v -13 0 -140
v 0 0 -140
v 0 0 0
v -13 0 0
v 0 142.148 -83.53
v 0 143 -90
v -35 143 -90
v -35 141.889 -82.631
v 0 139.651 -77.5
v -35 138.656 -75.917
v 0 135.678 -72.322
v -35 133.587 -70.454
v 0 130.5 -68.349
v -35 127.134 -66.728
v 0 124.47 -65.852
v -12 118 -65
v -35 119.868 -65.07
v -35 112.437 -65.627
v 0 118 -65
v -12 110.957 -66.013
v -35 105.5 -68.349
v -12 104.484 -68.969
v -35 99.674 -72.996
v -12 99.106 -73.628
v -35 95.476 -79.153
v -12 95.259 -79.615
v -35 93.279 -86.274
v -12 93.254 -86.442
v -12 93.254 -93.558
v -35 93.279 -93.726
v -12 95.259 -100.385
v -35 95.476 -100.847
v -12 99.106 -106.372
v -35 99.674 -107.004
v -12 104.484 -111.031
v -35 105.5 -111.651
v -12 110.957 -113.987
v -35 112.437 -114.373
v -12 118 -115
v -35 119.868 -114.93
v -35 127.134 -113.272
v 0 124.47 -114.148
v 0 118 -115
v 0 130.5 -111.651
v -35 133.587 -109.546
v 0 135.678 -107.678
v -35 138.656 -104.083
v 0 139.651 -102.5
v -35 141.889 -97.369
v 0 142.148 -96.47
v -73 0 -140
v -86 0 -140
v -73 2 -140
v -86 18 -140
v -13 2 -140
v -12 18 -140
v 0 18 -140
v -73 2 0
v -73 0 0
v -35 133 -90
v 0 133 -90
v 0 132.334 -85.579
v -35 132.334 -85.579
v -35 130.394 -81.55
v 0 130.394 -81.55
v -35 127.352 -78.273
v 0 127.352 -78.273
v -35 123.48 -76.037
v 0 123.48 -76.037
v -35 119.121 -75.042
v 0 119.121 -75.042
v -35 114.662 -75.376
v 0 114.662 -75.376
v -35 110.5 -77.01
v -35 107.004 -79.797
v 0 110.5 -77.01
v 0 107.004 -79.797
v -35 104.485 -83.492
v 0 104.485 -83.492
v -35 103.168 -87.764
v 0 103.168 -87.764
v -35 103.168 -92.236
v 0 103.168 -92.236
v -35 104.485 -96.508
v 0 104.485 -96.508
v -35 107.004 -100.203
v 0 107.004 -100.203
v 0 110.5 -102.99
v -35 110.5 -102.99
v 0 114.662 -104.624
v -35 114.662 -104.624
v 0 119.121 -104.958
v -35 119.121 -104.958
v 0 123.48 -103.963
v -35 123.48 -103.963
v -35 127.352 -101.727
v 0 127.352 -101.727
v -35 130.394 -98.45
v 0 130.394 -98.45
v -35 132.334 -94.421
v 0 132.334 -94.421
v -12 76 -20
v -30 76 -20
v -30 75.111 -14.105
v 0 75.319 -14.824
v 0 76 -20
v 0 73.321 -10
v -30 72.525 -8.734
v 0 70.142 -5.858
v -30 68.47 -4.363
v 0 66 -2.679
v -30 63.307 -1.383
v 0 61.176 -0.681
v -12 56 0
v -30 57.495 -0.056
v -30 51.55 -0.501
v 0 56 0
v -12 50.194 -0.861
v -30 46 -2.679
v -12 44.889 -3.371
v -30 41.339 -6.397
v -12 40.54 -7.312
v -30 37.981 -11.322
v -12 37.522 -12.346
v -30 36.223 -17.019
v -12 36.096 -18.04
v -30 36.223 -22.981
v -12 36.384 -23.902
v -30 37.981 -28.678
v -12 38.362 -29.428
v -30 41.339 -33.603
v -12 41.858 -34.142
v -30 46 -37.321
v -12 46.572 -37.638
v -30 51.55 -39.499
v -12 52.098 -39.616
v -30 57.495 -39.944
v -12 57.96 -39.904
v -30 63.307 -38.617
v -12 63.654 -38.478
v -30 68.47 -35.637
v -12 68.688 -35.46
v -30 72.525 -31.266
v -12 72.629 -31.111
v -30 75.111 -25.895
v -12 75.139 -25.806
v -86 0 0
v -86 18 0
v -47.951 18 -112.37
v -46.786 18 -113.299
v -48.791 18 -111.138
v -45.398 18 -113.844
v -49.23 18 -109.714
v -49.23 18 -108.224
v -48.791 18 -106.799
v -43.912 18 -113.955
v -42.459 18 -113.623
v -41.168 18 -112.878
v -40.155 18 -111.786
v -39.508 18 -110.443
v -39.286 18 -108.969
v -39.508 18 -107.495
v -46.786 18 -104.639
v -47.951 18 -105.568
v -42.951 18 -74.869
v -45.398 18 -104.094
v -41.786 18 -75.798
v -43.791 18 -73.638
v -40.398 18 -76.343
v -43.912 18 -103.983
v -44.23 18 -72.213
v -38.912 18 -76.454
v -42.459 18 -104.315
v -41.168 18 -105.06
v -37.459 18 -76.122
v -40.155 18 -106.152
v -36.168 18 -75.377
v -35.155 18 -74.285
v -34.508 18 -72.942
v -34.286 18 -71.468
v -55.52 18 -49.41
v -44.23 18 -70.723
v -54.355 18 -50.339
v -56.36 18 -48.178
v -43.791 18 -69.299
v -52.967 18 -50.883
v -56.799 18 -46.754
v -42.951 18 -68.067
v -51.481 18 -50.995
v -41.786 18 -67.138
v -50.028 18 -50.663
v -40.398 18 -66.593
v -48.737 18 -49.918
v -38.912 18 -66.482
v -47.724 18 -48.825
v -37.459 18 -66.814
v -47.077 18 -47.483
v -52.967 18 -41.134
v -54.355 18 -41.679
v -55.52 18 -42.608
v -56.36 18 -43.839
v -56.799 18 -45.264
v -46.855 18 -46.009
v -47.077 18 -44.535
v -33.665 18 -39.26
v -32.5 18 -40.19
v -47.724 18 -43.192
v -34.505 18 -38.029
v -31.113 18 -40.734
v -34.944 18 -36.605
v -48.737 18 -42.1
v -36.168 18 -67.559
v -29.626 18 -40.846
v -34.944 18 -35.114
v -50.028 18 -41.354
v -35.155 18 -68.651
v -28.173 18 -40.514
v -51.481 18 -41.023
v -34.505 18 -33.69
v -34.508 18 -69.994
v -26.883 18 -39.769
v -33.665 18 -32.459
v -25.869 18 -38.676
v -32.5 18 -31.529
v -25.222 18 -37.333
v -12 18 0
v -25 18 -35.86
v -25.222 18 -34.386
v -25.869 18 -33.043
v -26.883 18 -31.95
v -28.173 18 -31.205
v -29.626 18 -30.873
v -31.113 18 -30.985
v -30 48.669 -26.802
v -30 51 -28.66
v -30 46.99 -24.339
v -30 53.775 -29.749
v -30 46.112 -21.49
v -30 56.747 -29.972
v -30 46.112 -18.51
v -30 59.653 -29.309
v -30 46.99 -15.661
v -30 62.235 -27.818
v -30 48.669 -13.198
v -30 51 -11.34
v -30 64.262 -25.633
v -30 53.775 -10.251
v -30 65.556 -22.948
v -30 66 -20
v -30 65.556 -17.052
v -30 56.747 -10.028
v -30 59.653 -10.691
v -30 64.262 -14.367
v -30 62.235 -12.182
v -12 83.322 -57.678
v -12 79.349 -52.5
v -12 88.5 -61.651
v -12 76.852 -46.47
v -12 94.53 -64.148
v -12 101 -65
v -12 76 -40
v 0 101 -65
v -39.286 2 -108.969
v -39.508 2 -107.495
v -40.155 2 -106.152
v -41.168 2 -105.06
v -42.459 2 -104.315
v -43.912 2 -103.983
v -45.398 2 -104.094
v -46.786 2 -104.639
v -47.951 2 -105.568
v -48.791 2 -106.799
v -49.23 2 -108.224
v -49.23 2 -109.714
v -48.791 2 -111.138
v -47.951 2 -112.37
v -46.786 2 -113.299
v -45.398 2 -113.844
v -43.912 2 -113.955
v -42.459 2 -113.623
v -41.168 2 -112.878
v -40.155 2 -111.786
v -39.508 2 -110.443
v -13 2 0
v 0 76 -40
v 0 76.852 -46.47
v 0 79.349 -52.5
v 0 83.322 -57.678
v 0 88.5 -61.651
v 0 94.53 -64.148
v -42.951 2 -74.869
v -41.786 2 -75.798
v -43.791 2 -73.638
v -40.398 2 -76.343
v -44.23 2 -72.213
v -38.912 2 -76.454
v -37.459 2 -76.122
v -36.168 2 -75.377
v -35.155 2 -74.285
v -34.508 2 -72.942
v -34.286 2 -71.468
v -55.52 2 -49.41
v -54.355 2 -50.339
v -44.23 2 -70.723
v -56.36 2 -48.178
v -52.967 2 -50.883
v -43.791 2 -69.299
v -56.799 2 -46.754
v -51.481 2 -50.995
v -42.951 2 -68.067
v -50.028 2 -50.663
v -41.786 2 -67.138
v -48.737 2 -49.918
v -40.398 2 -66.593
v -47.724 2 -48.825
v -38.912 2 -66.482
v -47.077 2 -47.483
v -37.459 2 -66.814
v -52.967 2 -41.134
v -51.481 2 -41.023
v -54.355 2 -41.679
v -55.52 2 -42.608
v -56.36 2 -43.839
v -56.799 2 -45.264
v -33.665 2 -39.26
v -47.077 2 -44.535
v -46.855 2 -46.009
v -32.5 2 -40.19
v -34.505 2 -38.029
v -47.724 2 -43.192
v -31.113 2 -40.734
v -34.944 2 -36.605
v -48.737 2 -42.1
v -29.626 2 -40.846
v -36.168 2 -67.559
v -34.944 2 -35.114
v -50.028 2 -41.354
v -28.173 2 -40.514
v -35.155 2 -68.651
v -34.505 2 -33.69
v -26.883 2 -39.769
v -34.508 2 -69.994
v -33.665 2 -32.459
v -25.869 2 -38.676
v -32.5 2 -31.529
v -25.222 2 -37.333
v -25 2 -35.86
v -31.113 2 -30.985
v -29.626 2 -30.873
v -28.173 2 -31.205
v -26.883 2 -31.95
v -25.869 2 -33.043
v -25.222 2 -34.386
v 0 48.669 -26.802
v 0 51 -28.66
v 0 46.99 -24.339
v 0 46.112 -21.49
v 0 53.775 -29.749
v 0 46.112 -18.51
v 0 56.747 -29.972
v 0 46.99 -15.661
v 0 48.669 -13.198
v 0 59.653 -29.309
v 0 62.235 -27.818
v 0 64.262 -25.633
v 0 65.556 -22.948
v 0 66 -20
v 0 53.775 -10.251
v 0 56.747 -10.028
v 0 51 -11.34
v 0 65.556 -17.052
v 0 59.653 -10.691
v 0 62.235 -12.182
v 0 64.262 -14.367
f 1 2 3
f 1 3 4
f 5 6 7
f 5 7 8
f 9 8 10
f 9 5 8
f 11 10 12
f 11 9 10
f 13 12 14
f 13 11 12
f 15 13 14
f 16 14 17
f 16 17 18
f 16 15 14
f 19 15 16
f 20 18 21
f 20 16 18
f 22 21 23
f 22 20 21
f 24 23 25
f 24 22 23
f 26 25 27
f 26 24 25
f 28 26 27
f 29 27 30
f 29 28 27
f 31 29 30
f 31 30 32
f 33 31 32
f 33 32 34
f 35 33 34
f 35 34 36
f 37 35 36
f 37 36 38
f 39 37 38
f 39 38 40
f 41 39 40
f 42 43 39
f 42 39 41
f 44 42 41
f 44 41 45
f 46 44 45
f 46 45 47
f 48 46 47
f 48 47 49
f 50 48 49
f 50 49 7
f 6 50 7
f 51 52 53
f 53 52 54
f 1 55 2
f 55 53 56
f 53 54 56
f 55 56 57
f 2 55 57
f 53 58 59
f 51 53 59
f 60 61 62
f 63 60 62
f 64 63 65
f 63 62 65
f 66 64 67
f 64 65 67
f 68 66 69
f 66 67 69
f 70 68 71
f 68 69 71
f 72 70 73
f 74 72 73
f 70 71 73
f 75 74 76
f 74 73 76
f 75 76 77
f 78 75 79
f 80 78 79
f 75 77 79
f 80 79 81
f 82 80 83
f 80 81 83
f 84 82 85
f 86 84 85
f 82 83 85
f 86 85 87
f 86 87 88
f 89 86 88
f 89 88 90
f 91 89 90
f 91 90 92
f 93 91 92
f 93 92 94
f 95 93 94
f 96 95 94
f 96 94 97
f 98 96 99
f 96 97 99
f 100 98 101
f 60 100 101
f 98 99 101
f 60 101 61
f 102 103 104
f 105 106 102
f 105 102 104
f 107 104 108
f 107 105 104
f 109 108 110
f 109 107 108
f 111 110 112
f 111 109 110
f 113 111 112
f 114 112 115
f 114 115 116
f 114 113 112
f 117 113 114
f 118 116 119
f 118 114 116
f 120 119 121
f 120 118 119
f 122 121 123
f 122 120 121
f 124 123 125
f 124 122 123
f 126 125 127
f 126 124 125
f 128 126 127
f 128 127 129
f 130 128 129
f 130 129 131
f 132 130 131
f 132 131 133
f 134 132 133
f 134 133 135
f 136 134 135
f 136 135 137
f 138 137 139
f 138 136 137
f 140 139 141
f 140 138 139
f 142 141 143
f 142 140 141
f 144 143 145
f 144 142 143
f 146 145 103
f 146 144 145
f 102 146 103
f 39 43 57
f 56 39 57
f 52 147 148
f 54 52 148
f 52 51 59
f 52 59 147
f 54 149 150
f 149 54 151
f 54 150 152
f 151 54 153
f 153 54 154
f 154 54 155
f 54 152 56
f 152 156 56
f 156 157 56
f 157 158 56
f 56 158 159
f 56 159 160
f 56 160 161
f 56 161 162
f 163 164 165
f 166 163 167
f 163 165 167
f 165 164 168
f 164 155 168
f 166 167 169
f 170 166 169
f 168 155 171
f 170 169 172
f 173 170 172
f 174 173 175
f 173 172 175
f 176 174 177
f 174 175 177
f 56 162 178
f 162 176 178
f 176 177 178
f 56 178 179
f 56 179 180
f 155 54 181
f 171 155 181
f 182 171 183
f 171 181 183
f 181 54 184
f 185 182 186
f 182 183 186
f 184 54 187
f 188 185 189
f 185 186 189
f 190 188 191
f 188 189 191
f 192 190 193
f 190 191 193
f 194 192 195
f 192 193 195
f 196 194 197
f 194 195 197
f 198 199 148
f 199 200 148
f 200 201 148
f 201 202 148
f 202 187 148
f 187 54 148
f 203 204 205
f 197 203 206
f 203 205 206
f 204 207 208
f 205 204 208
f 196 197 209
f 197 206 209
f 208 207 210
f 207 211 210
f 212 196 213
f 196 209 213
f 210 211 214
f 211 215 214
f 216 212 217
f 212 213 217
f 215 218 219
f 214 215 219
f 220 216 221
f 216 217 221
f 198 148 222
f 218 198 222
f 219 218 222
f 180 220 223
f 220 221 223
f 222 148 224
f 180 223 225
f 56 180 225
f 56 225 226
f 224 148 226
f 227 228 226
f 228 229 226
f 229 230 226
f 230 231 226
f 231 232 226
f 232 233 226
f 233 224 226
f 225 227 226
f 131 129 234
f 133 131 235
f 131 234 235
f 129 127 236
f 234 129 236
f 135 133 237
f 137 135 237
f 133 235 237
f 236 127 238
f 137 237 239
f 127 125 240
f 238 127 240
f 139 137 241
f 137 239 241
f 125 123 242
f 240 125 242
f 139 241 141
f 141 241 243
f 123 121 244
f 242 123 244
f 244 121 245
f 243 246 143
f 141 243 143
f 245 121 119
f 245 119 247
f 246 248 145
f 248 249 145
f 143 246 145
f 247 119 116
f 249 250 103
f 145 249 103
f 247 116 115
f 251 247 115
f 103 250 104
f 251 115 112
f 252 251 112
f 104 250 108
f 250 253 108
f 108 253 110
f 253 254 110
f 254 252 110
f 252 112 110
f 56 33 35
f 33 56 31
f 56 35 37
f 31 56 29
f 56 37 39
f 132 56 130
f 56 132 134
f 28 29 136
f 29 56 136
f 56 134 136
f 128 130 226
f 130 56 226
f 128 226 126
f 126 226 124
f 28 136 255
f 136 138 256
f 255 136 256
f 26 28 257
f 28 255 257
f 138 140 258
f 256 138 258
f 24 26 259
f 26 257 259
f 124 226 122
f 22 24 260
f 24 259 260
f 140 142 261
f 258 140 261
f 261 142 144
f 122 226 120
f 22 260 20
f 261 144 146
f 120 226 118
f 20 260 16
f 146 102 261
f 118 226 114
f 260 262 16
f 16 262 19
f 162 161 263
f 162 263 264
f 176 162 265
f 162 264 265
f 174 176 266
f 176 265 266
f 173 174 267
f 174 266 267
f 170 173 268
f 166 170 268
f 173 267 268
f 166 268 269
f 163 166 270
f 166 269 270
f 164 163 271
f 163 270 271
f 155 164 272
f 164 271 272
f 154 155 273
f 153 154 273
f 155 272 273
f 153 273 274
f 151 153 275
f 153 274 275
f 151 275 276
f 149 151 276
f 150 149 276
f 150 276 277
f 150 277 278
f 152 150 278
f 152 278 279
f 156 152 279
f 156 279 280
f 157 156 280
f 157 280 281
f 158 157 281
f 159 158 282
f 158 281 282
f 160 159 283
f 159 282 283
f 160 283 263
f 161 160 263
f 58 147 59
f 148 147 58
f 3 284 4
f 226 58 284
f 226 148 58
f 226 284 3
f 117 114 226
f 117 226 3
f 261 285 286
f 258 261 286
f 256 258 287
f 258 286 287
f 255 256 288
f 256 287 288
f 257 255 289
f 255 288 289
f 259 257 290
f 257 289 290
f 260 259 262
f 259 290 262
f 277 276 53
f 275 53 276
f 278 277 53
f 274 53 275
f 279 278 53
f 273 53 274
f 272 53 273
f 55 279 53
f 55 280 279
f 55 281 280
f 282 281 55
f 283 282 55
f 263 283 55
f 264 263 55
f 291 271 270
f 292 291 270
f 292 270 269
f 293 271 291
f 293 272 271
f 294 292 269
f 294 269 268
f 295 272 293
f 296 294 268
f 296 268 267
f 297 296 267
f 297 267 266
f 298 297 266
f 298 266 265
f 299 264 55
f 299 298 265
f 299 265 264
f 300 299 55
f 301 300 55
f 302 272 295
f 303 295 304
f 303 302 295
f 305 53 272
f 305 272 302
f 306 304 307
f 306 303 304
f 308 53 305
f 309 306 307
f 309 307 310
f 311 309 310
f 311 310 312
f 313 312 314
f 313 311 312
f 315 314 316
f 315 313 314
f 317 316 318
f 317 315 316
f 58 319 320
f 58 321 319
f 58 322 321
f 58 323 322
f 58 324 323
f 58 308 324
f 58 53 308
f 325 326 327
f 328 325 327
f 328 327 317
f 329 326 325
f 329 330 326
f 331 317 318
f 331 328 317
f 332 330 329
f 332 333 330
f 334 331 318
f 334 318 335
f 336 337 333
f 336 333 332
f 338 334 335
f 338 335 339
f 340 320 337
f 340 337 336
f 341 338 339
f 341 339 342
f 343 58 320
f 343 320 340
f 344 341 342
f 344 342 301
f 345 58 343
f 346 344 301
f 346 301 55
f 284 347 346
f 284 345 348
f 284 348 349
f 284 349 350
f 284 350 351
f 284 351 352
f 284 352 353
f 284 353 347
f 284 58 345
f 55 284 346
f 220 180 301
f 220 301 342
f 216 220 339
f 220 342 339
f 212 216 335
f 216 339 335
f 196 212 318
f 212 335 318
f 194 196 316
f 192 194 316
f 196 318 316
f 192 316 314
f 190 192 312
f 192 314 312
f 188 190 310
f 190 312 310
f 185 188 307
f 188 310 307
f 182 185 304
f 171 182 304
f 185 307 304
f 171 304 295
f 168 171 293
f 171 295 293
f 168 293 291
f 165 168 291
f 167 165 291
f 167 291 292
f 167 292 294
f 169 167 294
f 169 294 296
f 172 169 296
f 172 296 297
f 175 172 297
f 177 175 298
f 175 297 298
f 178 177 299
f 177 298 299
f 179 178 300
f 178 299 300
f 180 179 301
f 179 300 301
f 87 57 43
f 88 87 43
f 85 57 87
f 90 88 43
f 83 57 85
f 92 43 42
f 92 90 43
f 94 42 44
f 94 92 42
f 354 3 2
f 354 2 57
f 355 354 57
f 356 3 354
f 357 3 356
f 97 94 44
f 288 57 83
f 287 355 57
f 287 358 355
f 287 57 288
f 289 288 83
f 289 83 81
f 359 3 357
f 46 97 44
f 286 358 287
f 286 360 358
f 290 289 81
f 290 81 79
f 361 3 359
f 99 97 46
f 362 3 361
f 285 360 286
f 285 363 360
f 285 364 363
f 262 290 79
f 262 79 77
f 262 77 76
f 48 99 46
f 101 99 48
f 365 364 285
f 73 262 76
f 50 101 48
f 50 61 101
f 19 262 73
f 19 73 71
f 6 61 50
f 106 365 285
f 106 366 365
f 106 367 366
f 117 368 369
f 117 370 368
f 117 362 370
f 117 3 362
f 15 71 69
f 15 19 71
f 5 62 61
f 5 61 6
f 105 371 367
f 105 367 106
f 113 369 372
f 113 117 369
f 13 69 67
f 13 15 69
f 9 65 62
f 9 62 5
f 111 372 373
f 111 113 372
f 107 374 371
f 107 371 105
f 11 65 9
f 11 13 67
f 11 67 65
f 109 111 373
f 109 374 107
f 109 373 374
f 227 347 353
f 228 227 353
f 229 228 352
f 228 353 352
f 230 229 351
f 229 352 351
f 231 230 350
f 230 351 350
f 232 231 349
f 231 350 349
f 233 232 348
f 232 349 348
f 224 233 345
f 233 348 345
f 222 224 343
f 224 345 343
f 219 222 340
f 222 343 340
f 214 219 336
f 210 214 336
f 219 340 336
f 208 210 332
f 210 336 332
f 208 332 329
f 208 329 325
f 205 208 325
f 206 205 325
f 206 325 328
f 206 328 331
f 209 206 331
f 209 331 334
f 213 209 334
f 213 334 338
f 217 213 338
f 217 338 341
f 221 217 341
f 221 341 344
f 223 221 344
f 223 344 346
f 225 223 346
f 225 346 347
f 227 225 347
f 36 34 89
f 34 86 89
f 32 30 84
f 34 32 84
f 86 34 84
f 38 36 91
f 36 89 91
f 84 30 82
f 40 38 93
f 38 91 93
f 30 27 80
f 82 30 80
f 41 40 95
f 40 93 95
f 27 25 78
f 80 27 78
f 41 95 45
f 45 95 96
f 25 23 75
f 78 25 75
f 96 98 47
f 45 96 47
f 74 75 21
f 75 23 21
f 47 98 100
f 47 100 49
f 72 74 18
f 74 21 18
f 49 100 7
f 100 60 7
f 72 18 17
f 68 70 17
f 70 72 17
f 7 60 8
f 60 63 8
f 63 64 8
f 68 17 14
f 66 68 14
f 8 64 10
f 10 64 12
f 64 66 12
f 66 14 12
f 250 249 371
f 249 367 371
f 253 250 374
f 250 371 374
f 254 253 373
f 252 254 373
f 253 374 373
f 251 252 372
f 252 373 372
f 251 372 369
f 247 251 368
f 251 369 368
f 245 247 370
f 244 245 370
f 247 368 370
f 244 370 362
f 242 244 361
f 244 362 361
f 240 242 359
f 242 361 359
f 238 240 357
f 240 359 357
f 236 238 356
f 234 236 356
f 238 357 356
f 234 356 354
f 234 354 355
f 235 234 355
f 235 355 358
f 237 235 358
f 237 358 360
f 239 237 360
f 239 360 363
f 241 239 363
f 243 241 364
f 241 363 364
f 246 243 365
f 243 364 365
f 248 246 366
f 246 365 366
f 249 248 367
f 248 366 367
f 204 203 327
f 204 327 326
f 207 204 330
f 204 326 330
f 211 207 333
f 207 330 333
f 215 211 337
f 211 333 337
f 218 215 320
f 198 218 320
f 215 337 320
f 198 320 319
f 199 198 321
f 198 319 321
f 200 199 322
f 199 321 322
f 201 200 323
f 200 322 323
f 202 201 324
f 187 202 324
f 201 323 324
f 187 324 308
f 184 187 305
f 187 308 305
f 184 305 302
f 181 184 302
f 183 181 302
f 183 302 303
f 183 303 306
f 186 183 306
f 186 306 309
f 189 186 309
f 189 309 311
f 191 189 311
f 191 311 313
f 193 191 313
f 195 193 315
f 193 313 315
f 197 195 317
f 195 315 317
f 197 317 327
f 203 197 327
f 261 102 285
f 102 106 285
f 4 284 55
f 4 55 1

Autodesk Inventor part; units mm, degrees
ref_plane "YZ Plane" through (0, 0, 0) normal (1, 0, 0) x (0, 1, 0)
ref_plane "XZ Plane" through (0, 0, 0) normal (0, 1, 0) x (-1, 0, 0)
ref_plane "XY Plane" through (0, 0, 0) normal (0, 0, 1) x (1, 0, 0)
sketch "Sketch1" plane through (0, 0, 0) normal (1, 0, 0) x (0, 1, 0)
  point P0 (0, 0)
sketch "Sketch2" plane through (0, 0, 0) normal (1, 0, 0) x (0, 1, 0)
  line L0 (0, 0) -> (118, 0)
  line L1 (118, 0) -> (118, -140)
  line L2 (118, -140) -> (0, -140)
  line L3 (0, -140) -> (0, 0)
  circle A0 centre (56, -20) radius 20
  circle A1 centre (56, -20) radius 10
  circle A2 centre (118, -90) radius 15
  circle A3 centre (118, -90) radius 25
  line L4 (118, -115) -> (18, -140)
  line L5 (101, -65) -> (118, -65)
  line L6 (76, -20) -> (76, -40)
  arc A4 (76, -40) -> (101, -65) centre (101, -40) ccw
  point P0 (56, 0)
  dimension "d2" = 40
  dimension "d0" = 140
  dimension "d1" = 118
  dimension "d3" = 20
  dimension "d4" = 30
  dimension "d5" = 50
  dimension "d6" = 56
  dimension "d7" = 56
  dimension "d8" = 20
  dimension "d9" = 20
  dimension "d10" = 50
  dimension "d11" = 50
  dimension "d12" = 18
sketch "Sketch3" plane through (0, 0, 0) normal (0, 0, 1) x (1, 0, 0)
  line L0 (0, 0) -> (-86, 0)
  line L1 (-86, 0) -> (-86, 18)
  line L2 (-86, 18) -> (0, 18)
  line L3 (0, 18) -> (0, 0)
  line L4 (-73, 2) -> (-13, 2)
  line L5 (-43, 18) -> (-43, 0)
  line L6 (-73, 2) -> (-73, 0)
  line L7 (-13, 2) -> (-13, 0)
  point P0 (-43, 2)
  dimension "d14" = 86
  dimension "d15" = 18
  dimension "d16" = 60
  dimension "d17" = 2
extrude "Extrusion1" add sketch "Sketch3" against normal blind 140 contours L0 L7 L4 L5 L2 L3 | L5 L4 L6 L0 L1 L2
extrude "Extrusion2" add sketch "Sketch2" against normal blind 12 contours L0 A0 L6 A4 L5 A3 L4 L2 L3
extrude "Extrusion3" add sketch "Sketch2" against normal blind 30 contours A0
extrude "Extrusion4" add sketch "Sketch2" against normal blind 35 contours A3 L1 A2 | L1 A2 A3
sketch "Sketch4" plane through (-73, 2, 0) normal (0, -1, 0) x (1, 0, 0)
  circle A0 centre (28.7142, -108.9689) radius 5
  circle A1 centre (33.7142, -71.4681) radius 5
  circle A2 centre (21.1452, -46.0088) radius 5
  line L0 (43, 0) -> (43, -40) projected
  circle A3 centre (43, -35.8595) radius 5
  point P0 (73, 0)
  dimension "d26" = 10
  dimension "d27" = 10
  dimension "d28" = 10
  dimension "d29" = 10
extrude "Extrusion5" cut sketch "Sketch4" against normal blind 18
properties part number "3"
